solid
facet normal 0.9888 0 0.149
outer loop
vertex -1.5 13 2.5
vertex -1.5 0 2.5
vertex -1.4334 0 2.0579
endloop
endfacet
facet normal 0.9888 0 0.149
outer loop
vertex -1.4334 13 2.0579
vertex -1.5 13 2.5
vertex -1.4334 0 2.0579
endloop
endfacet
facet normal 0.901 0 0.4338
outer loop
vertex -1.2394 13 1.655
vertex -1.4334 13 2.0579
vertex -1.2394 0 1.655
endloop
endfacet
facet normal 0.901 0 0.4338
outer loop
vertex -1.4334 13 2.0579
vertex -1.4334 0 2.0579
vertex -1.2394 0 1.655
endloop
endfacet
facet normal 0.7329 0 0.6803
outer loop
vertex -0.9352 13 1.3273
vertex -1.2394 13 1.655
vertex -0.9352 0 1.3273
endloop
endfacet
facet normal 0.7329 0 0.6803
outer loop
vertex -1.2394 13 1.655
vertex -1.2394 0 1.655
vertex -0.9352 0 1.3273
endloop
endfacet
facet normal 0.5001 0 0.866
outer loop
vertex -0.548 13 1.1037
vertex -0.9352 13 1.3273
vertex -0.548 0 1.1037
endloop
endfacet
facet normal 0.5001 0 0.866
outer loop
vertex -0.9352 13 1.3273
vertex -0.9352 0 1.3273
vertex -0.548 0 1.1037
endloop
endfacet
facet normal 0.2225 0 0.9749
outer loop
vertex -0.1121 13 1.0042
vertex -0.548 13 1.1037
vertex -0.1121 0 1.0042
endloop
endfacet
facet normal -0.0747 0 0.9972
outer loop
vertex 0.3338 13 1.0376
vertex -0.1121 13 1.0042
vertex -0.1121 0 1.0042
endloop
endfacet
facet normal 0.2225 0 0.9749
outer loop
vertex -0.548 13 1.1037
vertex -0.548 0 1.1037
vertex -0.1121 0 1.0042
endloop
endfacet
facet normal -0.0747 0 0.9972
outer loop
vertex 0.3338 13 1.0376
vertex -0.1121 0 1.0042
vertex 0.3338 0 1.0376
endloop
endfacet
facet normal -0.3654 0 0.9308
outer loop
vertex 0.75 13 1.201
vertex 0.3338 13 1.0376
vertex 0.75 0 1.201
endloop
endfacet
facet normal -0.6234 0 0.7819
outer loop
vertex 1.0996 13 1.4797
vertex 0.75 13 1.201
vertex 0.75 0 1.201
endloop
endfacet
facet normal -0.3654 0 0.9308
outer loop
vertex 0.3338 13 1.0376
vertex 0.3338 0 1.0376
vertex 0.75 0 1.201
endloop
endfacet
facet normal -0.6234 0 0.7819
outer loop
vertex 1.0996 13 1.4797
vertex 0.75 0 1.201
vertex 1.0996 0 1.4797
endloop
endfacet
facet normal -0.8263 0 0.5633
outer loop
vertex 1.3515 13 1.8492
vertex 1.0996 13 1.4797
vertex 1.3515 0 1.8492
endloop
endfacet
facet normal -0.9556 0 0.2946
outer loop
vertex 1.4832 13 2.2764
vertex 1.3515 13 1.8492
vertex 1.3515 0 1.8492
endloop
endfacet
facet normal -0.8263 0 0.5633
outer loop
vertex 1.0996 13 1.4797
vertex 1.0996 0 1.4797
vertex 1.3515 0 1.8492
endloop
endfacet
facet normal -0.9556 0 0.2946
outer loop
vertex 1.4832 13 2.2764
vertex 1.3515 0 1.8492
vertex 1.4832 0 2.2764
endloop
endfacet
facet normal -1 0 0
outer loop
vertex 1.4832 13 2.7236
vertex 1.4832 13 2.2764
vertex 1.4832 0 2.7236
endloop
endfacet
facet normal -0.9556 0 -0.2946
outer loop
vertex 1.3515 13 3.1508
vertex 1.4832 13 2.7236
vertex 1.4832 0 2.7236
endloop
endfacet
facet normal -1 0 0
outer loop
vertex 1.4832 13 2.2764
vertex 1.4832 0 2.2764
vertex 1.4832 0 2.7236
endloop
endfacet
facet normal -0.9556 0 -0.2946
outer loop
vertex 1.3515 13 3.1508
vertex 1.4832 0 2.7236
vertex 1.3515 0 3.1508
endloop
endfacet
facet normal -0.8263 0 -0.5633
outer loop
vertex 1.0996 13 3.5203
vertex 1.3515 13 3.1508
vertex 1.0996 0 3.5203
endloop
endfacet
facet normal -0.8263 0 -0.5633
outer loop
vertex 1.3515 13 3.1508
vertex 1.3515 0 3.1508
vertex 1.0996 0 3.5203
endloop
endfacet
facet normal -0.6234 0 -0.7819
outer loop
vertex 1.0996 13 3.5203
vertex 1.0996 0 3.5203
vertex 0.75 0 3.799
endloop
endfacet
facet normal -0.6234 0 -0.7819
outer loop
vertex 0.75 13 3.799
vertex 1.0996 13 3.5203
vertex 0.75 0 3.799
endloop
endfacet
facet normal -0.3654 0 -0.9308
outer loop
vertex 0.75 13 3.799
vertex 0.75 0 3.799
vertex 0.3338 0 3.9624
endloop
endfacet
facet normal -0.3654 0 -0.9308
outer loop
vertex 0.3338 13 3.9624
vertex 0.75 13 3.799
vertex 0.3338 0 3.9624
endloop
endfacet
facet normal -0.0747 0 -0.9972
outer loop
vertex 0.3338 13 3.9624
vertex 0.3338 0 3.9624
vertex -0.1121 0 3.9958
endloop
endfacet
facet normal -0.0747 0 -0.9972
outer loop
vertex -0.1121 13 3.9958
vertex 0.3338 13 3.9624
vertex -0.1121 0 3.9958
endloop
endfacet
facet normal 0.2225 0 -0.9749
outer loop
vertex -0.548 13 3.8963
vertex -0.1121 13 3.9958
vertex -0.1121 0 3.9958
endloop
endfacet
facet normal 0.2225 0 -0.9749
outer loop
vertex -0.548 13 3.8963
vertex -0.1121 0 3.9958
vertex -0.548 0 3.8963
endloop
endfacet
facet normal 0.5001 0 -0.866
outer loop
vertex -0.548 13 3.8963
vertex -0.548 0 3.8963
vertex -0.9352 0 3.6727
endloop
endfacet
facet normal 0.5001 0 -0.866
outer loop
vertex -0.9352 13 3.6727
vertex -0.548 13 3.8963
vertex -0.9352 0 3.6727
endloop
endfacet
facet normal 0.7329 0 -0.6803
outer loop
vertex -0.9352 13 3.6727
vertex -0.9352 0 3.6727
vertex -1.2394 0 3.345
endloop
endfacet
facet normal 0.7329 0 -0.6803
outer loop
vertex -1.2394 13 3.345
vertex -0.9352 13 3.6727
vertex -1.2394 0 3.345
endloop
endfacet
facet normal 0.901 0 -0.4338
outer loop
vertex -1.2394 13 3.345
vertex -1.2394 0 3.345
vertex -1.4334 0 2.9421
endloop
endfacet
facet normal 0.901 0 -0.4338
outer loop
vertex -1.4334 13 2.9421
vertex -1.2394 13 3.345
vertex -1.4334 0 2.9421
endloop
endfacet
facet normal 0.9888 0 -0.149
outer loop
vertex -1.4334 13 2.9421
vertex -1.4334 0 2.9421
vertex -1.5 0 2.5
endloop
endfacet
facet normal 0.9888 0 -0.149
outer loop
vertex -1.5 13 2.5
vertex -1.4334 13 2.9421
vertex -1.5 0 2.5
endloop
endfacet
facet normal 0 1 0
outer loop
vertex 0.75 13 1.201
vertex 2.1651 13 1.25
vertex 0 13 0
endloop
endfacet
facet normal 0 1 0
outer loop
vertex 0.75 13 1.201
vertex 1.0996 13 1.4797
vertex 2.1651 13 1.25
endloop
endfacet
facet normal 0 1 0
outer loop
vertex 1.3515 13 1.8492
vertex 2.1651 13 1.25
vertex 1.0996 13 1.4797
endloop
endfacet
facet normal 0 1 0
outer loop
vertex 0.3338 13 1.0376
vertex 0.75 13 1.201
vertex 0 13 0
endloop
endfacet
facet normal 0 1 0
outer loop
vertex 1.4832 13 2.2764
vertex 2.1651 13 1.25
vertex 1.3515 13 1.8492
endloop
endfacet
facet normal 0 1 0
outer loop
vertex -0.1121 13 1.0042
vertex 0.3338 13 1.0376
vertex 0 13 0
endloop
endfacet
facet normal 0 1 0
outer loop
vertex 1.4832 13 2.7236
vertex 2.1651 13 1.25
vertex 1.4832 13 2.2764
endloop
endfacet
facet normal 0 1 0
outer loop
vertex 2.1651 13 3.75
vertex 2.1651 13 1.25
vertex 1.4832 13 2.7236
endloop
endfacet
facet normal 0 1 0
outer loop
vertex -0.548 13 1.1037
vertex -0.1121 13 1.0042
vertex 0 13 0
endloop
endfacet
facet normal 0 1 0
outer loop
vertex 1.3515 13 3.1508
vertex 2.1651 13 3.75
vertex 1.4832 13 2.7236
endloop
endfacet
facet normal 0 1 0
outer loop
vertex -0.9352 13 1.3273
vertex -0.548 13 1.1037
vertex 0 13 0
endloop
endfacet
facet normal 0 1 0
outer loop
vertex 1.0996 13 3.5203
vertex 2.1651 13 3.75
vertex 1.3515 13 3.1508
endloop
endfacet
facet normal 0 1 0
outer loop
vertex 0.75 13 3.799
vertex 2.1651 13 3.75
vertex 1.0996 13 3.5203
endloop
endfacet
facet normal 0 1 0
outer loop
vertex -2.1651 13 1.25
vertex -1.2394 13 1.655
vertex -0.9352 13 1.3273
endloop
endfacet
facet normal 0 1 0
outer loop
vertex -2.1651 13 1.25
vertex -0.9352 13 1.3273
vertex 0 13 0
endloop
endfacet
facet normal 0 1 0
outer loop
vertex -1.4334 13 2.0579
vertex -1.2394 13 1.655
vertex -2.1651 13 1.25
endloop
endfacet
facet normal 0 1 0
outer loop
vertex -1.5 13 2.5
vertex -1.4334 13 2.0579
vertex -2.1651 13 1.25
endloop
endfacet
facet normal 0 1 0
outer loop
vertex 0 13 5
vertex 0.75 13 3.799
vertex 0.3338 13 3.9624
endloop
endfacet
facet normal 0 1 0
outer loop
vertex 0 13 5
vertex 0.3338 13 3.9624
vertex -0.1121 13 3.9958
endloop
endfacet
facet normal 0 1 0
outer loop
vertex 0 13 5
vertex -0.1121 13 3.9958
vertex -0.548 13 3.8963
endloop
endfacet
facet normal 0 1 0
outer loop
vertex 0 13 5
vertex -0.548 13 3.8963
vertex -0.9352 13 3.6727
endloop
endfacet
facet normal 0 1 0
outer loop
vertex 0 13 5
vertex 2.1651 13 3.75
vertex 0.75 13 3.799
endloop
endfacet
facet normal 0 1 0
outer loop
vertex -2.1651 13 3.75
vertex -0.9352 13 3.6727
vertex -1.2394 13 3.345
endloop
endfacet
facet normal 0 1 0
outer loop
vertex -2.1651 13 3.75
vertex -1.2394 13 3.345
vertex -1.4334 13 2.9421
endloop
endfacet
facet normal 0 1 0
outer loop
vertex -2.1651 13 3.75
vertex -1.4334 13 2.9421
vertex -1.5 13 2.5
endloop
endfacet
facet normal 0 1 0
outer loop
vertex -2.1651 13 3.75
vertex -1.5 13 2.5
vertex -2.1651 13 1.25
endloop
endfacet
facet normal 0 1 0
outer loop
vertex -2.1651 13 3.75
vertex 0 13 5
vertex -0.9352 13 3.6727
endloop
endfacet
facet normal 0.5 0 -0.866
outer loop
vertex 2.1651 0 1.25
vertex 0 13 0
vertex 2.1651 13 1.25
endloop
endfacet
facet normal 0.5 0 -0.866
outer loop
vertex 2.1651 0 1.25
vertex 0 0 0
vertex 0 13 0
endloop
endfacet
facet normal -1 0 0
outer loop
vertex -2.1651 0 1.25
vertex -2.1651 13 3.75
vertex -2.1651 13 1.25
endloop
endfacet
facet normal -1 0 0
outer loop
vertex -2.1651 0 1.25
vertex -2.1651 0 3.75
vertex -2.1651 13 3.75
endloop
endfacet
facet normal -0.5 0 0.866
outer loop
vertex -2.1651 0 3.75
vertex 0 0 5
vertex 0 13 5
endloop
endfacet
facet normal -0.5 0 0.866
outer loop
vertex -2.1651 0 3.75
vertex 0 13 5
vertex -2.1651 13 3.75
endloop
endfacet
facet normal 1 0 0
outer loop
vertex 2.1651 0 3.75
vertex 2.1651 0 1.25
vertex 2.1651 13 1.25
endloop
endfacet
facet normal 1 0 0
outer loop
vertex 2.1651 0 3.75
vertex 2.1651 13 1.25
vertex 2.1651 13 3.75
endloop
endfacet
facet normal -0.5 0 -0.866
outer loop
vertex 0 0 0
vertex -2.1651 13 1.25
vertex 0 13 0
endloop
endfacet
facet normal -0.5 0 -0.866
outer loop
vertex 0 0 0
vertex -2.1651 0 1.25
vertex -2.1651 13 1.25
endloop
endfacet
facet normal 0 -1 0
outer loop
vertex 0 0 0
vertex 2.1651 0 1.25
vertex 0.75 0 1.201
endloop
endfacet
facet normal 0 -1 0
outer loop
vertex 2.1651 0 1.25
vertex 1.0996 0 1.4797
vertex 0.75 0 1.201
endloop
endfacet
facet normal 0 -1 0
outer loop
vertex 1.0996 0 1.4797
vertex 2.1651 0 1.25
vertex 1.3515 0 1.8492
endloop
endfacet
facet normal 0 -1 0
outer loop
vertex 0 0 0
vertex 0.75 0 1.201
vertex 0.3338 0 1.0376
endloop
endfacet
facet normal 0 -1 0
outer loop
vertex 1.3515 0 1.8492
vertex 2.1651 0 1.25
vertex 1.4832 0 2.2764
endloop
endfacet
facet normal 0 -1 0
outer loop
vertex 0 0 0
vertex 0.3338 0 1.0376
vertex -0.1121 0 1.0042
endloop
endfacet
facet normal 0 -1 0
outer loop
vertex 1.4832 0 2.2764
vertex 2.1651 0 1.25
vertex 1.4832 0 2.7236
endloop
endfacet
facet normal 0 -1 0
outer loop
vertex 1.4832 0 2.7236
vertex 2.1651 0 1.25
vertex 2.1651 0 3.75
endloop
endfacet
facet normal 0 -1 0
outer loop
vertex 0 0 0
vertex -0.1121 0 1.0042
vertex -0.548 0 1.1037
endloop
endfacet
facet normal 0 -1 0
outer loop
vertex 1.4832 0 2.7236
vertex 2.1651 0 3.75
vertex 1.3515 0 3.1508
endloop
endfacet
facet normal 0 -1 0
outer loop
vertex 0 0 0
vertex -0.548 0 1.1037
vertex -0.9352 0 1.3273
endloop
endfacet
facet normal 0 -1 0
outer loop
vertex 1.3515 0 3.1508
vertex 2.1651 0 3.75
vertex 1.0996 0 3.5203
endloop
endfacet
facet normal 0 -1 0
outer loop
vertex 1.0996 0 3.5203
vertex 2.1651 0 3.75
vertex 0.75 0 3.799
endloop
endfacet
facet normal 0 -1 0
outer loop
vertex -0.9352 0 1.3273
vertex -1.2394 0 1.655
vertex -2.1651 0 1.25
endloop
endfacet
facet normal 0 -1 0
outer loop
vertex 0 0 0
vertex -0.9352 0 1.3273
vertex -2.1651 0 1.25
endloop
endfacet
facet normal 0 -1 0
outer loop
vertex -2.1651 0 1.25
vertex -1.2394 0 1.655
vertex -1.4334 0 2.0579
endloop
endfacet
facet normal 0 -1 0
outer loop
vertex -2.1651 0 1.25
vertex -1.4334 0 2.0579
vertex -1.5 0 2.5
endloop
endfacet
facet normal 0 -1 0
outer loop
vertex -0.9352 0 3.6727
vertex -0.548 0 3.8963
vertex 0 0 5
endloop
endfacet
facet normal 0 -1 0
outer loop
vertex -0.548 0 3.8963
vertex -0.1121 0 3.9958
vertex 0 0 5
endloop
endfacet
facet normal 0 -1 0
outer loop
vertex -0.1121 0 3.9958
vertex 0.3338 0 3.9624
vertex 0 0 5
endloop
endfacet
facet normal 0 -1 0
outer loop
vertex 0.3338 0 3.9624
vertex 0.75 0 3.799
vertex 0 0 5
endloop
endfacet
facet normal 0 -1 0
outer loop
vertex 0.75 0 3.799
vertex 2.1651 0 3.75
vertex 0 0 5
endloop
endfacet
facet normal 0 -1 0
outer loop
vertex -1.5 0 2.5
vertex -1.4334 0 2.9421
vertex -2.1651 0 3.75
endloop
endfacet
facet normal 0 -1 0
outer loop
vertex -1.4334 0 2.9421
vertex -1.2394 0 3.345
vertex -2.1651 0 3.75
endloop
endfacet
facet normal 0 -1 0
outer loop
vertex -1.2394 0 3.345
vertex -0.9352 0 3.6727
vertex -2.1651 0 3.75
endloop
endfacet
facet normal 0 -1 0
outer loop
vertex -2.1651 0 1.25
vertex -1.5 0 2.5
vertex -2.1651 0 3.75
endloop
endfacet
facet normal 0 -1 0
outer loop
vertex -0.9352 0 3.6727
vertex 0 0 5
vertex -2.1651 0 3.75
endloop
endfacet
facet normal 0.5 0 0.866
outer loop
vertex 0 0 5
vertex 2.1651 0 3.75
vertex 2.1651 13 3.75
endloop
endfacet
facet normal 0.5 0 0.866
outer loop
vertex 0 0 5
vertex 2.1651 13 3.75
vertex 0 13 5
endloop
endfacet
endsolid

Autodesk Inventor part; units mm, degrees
ref_plane "YZ Plane" through (0, 0, 0) normal (1, 0, 0) x (0, 1, 0)
ref_plane "XZ Plane" through (0, 0, 0) normal (0, 1, 0) x (-1, 0, 0)
ref_plane "XY Plane" through (0, 0, 0) normal (0, 0, 1) x (1, 0, 0)
sketch "Эскиз1" plane through (0, 0, 0) normal (0, 1, 0) x (-1, 0, 0)
  line L0 (0, 0) -> (0, 5)
  line L1 (0, 0) -> (-2.1651, 1.25)
  line L2 (-2.1651, 1.25) -> (-2.1651, 3.75)
  line L3 (-2.1651, 3.75) -> (0, 5)
  line L4 (0, 5) -> (2.1651, 3.75)
  line L5 (2.1651, 3.75) -> (2.1651, 1.25)
  line L6 (2.1651, 1.25) -> (0, 0)
  circle A0 centre (0, 2.5) radius 1.5
  dimension "d0" = 5
  dimension "d1" = 3
extrude "Выдавливание1" add sketch "Эскиз1" along normal blind 13 contours L1 L2 L3 L0 A0 | L0 A0 L4 L5 L6
thread "Резьба1" size "M3x0.5" class "6H" standard "ANSI Metric M Profile" full length
properties part number "rack_25"
